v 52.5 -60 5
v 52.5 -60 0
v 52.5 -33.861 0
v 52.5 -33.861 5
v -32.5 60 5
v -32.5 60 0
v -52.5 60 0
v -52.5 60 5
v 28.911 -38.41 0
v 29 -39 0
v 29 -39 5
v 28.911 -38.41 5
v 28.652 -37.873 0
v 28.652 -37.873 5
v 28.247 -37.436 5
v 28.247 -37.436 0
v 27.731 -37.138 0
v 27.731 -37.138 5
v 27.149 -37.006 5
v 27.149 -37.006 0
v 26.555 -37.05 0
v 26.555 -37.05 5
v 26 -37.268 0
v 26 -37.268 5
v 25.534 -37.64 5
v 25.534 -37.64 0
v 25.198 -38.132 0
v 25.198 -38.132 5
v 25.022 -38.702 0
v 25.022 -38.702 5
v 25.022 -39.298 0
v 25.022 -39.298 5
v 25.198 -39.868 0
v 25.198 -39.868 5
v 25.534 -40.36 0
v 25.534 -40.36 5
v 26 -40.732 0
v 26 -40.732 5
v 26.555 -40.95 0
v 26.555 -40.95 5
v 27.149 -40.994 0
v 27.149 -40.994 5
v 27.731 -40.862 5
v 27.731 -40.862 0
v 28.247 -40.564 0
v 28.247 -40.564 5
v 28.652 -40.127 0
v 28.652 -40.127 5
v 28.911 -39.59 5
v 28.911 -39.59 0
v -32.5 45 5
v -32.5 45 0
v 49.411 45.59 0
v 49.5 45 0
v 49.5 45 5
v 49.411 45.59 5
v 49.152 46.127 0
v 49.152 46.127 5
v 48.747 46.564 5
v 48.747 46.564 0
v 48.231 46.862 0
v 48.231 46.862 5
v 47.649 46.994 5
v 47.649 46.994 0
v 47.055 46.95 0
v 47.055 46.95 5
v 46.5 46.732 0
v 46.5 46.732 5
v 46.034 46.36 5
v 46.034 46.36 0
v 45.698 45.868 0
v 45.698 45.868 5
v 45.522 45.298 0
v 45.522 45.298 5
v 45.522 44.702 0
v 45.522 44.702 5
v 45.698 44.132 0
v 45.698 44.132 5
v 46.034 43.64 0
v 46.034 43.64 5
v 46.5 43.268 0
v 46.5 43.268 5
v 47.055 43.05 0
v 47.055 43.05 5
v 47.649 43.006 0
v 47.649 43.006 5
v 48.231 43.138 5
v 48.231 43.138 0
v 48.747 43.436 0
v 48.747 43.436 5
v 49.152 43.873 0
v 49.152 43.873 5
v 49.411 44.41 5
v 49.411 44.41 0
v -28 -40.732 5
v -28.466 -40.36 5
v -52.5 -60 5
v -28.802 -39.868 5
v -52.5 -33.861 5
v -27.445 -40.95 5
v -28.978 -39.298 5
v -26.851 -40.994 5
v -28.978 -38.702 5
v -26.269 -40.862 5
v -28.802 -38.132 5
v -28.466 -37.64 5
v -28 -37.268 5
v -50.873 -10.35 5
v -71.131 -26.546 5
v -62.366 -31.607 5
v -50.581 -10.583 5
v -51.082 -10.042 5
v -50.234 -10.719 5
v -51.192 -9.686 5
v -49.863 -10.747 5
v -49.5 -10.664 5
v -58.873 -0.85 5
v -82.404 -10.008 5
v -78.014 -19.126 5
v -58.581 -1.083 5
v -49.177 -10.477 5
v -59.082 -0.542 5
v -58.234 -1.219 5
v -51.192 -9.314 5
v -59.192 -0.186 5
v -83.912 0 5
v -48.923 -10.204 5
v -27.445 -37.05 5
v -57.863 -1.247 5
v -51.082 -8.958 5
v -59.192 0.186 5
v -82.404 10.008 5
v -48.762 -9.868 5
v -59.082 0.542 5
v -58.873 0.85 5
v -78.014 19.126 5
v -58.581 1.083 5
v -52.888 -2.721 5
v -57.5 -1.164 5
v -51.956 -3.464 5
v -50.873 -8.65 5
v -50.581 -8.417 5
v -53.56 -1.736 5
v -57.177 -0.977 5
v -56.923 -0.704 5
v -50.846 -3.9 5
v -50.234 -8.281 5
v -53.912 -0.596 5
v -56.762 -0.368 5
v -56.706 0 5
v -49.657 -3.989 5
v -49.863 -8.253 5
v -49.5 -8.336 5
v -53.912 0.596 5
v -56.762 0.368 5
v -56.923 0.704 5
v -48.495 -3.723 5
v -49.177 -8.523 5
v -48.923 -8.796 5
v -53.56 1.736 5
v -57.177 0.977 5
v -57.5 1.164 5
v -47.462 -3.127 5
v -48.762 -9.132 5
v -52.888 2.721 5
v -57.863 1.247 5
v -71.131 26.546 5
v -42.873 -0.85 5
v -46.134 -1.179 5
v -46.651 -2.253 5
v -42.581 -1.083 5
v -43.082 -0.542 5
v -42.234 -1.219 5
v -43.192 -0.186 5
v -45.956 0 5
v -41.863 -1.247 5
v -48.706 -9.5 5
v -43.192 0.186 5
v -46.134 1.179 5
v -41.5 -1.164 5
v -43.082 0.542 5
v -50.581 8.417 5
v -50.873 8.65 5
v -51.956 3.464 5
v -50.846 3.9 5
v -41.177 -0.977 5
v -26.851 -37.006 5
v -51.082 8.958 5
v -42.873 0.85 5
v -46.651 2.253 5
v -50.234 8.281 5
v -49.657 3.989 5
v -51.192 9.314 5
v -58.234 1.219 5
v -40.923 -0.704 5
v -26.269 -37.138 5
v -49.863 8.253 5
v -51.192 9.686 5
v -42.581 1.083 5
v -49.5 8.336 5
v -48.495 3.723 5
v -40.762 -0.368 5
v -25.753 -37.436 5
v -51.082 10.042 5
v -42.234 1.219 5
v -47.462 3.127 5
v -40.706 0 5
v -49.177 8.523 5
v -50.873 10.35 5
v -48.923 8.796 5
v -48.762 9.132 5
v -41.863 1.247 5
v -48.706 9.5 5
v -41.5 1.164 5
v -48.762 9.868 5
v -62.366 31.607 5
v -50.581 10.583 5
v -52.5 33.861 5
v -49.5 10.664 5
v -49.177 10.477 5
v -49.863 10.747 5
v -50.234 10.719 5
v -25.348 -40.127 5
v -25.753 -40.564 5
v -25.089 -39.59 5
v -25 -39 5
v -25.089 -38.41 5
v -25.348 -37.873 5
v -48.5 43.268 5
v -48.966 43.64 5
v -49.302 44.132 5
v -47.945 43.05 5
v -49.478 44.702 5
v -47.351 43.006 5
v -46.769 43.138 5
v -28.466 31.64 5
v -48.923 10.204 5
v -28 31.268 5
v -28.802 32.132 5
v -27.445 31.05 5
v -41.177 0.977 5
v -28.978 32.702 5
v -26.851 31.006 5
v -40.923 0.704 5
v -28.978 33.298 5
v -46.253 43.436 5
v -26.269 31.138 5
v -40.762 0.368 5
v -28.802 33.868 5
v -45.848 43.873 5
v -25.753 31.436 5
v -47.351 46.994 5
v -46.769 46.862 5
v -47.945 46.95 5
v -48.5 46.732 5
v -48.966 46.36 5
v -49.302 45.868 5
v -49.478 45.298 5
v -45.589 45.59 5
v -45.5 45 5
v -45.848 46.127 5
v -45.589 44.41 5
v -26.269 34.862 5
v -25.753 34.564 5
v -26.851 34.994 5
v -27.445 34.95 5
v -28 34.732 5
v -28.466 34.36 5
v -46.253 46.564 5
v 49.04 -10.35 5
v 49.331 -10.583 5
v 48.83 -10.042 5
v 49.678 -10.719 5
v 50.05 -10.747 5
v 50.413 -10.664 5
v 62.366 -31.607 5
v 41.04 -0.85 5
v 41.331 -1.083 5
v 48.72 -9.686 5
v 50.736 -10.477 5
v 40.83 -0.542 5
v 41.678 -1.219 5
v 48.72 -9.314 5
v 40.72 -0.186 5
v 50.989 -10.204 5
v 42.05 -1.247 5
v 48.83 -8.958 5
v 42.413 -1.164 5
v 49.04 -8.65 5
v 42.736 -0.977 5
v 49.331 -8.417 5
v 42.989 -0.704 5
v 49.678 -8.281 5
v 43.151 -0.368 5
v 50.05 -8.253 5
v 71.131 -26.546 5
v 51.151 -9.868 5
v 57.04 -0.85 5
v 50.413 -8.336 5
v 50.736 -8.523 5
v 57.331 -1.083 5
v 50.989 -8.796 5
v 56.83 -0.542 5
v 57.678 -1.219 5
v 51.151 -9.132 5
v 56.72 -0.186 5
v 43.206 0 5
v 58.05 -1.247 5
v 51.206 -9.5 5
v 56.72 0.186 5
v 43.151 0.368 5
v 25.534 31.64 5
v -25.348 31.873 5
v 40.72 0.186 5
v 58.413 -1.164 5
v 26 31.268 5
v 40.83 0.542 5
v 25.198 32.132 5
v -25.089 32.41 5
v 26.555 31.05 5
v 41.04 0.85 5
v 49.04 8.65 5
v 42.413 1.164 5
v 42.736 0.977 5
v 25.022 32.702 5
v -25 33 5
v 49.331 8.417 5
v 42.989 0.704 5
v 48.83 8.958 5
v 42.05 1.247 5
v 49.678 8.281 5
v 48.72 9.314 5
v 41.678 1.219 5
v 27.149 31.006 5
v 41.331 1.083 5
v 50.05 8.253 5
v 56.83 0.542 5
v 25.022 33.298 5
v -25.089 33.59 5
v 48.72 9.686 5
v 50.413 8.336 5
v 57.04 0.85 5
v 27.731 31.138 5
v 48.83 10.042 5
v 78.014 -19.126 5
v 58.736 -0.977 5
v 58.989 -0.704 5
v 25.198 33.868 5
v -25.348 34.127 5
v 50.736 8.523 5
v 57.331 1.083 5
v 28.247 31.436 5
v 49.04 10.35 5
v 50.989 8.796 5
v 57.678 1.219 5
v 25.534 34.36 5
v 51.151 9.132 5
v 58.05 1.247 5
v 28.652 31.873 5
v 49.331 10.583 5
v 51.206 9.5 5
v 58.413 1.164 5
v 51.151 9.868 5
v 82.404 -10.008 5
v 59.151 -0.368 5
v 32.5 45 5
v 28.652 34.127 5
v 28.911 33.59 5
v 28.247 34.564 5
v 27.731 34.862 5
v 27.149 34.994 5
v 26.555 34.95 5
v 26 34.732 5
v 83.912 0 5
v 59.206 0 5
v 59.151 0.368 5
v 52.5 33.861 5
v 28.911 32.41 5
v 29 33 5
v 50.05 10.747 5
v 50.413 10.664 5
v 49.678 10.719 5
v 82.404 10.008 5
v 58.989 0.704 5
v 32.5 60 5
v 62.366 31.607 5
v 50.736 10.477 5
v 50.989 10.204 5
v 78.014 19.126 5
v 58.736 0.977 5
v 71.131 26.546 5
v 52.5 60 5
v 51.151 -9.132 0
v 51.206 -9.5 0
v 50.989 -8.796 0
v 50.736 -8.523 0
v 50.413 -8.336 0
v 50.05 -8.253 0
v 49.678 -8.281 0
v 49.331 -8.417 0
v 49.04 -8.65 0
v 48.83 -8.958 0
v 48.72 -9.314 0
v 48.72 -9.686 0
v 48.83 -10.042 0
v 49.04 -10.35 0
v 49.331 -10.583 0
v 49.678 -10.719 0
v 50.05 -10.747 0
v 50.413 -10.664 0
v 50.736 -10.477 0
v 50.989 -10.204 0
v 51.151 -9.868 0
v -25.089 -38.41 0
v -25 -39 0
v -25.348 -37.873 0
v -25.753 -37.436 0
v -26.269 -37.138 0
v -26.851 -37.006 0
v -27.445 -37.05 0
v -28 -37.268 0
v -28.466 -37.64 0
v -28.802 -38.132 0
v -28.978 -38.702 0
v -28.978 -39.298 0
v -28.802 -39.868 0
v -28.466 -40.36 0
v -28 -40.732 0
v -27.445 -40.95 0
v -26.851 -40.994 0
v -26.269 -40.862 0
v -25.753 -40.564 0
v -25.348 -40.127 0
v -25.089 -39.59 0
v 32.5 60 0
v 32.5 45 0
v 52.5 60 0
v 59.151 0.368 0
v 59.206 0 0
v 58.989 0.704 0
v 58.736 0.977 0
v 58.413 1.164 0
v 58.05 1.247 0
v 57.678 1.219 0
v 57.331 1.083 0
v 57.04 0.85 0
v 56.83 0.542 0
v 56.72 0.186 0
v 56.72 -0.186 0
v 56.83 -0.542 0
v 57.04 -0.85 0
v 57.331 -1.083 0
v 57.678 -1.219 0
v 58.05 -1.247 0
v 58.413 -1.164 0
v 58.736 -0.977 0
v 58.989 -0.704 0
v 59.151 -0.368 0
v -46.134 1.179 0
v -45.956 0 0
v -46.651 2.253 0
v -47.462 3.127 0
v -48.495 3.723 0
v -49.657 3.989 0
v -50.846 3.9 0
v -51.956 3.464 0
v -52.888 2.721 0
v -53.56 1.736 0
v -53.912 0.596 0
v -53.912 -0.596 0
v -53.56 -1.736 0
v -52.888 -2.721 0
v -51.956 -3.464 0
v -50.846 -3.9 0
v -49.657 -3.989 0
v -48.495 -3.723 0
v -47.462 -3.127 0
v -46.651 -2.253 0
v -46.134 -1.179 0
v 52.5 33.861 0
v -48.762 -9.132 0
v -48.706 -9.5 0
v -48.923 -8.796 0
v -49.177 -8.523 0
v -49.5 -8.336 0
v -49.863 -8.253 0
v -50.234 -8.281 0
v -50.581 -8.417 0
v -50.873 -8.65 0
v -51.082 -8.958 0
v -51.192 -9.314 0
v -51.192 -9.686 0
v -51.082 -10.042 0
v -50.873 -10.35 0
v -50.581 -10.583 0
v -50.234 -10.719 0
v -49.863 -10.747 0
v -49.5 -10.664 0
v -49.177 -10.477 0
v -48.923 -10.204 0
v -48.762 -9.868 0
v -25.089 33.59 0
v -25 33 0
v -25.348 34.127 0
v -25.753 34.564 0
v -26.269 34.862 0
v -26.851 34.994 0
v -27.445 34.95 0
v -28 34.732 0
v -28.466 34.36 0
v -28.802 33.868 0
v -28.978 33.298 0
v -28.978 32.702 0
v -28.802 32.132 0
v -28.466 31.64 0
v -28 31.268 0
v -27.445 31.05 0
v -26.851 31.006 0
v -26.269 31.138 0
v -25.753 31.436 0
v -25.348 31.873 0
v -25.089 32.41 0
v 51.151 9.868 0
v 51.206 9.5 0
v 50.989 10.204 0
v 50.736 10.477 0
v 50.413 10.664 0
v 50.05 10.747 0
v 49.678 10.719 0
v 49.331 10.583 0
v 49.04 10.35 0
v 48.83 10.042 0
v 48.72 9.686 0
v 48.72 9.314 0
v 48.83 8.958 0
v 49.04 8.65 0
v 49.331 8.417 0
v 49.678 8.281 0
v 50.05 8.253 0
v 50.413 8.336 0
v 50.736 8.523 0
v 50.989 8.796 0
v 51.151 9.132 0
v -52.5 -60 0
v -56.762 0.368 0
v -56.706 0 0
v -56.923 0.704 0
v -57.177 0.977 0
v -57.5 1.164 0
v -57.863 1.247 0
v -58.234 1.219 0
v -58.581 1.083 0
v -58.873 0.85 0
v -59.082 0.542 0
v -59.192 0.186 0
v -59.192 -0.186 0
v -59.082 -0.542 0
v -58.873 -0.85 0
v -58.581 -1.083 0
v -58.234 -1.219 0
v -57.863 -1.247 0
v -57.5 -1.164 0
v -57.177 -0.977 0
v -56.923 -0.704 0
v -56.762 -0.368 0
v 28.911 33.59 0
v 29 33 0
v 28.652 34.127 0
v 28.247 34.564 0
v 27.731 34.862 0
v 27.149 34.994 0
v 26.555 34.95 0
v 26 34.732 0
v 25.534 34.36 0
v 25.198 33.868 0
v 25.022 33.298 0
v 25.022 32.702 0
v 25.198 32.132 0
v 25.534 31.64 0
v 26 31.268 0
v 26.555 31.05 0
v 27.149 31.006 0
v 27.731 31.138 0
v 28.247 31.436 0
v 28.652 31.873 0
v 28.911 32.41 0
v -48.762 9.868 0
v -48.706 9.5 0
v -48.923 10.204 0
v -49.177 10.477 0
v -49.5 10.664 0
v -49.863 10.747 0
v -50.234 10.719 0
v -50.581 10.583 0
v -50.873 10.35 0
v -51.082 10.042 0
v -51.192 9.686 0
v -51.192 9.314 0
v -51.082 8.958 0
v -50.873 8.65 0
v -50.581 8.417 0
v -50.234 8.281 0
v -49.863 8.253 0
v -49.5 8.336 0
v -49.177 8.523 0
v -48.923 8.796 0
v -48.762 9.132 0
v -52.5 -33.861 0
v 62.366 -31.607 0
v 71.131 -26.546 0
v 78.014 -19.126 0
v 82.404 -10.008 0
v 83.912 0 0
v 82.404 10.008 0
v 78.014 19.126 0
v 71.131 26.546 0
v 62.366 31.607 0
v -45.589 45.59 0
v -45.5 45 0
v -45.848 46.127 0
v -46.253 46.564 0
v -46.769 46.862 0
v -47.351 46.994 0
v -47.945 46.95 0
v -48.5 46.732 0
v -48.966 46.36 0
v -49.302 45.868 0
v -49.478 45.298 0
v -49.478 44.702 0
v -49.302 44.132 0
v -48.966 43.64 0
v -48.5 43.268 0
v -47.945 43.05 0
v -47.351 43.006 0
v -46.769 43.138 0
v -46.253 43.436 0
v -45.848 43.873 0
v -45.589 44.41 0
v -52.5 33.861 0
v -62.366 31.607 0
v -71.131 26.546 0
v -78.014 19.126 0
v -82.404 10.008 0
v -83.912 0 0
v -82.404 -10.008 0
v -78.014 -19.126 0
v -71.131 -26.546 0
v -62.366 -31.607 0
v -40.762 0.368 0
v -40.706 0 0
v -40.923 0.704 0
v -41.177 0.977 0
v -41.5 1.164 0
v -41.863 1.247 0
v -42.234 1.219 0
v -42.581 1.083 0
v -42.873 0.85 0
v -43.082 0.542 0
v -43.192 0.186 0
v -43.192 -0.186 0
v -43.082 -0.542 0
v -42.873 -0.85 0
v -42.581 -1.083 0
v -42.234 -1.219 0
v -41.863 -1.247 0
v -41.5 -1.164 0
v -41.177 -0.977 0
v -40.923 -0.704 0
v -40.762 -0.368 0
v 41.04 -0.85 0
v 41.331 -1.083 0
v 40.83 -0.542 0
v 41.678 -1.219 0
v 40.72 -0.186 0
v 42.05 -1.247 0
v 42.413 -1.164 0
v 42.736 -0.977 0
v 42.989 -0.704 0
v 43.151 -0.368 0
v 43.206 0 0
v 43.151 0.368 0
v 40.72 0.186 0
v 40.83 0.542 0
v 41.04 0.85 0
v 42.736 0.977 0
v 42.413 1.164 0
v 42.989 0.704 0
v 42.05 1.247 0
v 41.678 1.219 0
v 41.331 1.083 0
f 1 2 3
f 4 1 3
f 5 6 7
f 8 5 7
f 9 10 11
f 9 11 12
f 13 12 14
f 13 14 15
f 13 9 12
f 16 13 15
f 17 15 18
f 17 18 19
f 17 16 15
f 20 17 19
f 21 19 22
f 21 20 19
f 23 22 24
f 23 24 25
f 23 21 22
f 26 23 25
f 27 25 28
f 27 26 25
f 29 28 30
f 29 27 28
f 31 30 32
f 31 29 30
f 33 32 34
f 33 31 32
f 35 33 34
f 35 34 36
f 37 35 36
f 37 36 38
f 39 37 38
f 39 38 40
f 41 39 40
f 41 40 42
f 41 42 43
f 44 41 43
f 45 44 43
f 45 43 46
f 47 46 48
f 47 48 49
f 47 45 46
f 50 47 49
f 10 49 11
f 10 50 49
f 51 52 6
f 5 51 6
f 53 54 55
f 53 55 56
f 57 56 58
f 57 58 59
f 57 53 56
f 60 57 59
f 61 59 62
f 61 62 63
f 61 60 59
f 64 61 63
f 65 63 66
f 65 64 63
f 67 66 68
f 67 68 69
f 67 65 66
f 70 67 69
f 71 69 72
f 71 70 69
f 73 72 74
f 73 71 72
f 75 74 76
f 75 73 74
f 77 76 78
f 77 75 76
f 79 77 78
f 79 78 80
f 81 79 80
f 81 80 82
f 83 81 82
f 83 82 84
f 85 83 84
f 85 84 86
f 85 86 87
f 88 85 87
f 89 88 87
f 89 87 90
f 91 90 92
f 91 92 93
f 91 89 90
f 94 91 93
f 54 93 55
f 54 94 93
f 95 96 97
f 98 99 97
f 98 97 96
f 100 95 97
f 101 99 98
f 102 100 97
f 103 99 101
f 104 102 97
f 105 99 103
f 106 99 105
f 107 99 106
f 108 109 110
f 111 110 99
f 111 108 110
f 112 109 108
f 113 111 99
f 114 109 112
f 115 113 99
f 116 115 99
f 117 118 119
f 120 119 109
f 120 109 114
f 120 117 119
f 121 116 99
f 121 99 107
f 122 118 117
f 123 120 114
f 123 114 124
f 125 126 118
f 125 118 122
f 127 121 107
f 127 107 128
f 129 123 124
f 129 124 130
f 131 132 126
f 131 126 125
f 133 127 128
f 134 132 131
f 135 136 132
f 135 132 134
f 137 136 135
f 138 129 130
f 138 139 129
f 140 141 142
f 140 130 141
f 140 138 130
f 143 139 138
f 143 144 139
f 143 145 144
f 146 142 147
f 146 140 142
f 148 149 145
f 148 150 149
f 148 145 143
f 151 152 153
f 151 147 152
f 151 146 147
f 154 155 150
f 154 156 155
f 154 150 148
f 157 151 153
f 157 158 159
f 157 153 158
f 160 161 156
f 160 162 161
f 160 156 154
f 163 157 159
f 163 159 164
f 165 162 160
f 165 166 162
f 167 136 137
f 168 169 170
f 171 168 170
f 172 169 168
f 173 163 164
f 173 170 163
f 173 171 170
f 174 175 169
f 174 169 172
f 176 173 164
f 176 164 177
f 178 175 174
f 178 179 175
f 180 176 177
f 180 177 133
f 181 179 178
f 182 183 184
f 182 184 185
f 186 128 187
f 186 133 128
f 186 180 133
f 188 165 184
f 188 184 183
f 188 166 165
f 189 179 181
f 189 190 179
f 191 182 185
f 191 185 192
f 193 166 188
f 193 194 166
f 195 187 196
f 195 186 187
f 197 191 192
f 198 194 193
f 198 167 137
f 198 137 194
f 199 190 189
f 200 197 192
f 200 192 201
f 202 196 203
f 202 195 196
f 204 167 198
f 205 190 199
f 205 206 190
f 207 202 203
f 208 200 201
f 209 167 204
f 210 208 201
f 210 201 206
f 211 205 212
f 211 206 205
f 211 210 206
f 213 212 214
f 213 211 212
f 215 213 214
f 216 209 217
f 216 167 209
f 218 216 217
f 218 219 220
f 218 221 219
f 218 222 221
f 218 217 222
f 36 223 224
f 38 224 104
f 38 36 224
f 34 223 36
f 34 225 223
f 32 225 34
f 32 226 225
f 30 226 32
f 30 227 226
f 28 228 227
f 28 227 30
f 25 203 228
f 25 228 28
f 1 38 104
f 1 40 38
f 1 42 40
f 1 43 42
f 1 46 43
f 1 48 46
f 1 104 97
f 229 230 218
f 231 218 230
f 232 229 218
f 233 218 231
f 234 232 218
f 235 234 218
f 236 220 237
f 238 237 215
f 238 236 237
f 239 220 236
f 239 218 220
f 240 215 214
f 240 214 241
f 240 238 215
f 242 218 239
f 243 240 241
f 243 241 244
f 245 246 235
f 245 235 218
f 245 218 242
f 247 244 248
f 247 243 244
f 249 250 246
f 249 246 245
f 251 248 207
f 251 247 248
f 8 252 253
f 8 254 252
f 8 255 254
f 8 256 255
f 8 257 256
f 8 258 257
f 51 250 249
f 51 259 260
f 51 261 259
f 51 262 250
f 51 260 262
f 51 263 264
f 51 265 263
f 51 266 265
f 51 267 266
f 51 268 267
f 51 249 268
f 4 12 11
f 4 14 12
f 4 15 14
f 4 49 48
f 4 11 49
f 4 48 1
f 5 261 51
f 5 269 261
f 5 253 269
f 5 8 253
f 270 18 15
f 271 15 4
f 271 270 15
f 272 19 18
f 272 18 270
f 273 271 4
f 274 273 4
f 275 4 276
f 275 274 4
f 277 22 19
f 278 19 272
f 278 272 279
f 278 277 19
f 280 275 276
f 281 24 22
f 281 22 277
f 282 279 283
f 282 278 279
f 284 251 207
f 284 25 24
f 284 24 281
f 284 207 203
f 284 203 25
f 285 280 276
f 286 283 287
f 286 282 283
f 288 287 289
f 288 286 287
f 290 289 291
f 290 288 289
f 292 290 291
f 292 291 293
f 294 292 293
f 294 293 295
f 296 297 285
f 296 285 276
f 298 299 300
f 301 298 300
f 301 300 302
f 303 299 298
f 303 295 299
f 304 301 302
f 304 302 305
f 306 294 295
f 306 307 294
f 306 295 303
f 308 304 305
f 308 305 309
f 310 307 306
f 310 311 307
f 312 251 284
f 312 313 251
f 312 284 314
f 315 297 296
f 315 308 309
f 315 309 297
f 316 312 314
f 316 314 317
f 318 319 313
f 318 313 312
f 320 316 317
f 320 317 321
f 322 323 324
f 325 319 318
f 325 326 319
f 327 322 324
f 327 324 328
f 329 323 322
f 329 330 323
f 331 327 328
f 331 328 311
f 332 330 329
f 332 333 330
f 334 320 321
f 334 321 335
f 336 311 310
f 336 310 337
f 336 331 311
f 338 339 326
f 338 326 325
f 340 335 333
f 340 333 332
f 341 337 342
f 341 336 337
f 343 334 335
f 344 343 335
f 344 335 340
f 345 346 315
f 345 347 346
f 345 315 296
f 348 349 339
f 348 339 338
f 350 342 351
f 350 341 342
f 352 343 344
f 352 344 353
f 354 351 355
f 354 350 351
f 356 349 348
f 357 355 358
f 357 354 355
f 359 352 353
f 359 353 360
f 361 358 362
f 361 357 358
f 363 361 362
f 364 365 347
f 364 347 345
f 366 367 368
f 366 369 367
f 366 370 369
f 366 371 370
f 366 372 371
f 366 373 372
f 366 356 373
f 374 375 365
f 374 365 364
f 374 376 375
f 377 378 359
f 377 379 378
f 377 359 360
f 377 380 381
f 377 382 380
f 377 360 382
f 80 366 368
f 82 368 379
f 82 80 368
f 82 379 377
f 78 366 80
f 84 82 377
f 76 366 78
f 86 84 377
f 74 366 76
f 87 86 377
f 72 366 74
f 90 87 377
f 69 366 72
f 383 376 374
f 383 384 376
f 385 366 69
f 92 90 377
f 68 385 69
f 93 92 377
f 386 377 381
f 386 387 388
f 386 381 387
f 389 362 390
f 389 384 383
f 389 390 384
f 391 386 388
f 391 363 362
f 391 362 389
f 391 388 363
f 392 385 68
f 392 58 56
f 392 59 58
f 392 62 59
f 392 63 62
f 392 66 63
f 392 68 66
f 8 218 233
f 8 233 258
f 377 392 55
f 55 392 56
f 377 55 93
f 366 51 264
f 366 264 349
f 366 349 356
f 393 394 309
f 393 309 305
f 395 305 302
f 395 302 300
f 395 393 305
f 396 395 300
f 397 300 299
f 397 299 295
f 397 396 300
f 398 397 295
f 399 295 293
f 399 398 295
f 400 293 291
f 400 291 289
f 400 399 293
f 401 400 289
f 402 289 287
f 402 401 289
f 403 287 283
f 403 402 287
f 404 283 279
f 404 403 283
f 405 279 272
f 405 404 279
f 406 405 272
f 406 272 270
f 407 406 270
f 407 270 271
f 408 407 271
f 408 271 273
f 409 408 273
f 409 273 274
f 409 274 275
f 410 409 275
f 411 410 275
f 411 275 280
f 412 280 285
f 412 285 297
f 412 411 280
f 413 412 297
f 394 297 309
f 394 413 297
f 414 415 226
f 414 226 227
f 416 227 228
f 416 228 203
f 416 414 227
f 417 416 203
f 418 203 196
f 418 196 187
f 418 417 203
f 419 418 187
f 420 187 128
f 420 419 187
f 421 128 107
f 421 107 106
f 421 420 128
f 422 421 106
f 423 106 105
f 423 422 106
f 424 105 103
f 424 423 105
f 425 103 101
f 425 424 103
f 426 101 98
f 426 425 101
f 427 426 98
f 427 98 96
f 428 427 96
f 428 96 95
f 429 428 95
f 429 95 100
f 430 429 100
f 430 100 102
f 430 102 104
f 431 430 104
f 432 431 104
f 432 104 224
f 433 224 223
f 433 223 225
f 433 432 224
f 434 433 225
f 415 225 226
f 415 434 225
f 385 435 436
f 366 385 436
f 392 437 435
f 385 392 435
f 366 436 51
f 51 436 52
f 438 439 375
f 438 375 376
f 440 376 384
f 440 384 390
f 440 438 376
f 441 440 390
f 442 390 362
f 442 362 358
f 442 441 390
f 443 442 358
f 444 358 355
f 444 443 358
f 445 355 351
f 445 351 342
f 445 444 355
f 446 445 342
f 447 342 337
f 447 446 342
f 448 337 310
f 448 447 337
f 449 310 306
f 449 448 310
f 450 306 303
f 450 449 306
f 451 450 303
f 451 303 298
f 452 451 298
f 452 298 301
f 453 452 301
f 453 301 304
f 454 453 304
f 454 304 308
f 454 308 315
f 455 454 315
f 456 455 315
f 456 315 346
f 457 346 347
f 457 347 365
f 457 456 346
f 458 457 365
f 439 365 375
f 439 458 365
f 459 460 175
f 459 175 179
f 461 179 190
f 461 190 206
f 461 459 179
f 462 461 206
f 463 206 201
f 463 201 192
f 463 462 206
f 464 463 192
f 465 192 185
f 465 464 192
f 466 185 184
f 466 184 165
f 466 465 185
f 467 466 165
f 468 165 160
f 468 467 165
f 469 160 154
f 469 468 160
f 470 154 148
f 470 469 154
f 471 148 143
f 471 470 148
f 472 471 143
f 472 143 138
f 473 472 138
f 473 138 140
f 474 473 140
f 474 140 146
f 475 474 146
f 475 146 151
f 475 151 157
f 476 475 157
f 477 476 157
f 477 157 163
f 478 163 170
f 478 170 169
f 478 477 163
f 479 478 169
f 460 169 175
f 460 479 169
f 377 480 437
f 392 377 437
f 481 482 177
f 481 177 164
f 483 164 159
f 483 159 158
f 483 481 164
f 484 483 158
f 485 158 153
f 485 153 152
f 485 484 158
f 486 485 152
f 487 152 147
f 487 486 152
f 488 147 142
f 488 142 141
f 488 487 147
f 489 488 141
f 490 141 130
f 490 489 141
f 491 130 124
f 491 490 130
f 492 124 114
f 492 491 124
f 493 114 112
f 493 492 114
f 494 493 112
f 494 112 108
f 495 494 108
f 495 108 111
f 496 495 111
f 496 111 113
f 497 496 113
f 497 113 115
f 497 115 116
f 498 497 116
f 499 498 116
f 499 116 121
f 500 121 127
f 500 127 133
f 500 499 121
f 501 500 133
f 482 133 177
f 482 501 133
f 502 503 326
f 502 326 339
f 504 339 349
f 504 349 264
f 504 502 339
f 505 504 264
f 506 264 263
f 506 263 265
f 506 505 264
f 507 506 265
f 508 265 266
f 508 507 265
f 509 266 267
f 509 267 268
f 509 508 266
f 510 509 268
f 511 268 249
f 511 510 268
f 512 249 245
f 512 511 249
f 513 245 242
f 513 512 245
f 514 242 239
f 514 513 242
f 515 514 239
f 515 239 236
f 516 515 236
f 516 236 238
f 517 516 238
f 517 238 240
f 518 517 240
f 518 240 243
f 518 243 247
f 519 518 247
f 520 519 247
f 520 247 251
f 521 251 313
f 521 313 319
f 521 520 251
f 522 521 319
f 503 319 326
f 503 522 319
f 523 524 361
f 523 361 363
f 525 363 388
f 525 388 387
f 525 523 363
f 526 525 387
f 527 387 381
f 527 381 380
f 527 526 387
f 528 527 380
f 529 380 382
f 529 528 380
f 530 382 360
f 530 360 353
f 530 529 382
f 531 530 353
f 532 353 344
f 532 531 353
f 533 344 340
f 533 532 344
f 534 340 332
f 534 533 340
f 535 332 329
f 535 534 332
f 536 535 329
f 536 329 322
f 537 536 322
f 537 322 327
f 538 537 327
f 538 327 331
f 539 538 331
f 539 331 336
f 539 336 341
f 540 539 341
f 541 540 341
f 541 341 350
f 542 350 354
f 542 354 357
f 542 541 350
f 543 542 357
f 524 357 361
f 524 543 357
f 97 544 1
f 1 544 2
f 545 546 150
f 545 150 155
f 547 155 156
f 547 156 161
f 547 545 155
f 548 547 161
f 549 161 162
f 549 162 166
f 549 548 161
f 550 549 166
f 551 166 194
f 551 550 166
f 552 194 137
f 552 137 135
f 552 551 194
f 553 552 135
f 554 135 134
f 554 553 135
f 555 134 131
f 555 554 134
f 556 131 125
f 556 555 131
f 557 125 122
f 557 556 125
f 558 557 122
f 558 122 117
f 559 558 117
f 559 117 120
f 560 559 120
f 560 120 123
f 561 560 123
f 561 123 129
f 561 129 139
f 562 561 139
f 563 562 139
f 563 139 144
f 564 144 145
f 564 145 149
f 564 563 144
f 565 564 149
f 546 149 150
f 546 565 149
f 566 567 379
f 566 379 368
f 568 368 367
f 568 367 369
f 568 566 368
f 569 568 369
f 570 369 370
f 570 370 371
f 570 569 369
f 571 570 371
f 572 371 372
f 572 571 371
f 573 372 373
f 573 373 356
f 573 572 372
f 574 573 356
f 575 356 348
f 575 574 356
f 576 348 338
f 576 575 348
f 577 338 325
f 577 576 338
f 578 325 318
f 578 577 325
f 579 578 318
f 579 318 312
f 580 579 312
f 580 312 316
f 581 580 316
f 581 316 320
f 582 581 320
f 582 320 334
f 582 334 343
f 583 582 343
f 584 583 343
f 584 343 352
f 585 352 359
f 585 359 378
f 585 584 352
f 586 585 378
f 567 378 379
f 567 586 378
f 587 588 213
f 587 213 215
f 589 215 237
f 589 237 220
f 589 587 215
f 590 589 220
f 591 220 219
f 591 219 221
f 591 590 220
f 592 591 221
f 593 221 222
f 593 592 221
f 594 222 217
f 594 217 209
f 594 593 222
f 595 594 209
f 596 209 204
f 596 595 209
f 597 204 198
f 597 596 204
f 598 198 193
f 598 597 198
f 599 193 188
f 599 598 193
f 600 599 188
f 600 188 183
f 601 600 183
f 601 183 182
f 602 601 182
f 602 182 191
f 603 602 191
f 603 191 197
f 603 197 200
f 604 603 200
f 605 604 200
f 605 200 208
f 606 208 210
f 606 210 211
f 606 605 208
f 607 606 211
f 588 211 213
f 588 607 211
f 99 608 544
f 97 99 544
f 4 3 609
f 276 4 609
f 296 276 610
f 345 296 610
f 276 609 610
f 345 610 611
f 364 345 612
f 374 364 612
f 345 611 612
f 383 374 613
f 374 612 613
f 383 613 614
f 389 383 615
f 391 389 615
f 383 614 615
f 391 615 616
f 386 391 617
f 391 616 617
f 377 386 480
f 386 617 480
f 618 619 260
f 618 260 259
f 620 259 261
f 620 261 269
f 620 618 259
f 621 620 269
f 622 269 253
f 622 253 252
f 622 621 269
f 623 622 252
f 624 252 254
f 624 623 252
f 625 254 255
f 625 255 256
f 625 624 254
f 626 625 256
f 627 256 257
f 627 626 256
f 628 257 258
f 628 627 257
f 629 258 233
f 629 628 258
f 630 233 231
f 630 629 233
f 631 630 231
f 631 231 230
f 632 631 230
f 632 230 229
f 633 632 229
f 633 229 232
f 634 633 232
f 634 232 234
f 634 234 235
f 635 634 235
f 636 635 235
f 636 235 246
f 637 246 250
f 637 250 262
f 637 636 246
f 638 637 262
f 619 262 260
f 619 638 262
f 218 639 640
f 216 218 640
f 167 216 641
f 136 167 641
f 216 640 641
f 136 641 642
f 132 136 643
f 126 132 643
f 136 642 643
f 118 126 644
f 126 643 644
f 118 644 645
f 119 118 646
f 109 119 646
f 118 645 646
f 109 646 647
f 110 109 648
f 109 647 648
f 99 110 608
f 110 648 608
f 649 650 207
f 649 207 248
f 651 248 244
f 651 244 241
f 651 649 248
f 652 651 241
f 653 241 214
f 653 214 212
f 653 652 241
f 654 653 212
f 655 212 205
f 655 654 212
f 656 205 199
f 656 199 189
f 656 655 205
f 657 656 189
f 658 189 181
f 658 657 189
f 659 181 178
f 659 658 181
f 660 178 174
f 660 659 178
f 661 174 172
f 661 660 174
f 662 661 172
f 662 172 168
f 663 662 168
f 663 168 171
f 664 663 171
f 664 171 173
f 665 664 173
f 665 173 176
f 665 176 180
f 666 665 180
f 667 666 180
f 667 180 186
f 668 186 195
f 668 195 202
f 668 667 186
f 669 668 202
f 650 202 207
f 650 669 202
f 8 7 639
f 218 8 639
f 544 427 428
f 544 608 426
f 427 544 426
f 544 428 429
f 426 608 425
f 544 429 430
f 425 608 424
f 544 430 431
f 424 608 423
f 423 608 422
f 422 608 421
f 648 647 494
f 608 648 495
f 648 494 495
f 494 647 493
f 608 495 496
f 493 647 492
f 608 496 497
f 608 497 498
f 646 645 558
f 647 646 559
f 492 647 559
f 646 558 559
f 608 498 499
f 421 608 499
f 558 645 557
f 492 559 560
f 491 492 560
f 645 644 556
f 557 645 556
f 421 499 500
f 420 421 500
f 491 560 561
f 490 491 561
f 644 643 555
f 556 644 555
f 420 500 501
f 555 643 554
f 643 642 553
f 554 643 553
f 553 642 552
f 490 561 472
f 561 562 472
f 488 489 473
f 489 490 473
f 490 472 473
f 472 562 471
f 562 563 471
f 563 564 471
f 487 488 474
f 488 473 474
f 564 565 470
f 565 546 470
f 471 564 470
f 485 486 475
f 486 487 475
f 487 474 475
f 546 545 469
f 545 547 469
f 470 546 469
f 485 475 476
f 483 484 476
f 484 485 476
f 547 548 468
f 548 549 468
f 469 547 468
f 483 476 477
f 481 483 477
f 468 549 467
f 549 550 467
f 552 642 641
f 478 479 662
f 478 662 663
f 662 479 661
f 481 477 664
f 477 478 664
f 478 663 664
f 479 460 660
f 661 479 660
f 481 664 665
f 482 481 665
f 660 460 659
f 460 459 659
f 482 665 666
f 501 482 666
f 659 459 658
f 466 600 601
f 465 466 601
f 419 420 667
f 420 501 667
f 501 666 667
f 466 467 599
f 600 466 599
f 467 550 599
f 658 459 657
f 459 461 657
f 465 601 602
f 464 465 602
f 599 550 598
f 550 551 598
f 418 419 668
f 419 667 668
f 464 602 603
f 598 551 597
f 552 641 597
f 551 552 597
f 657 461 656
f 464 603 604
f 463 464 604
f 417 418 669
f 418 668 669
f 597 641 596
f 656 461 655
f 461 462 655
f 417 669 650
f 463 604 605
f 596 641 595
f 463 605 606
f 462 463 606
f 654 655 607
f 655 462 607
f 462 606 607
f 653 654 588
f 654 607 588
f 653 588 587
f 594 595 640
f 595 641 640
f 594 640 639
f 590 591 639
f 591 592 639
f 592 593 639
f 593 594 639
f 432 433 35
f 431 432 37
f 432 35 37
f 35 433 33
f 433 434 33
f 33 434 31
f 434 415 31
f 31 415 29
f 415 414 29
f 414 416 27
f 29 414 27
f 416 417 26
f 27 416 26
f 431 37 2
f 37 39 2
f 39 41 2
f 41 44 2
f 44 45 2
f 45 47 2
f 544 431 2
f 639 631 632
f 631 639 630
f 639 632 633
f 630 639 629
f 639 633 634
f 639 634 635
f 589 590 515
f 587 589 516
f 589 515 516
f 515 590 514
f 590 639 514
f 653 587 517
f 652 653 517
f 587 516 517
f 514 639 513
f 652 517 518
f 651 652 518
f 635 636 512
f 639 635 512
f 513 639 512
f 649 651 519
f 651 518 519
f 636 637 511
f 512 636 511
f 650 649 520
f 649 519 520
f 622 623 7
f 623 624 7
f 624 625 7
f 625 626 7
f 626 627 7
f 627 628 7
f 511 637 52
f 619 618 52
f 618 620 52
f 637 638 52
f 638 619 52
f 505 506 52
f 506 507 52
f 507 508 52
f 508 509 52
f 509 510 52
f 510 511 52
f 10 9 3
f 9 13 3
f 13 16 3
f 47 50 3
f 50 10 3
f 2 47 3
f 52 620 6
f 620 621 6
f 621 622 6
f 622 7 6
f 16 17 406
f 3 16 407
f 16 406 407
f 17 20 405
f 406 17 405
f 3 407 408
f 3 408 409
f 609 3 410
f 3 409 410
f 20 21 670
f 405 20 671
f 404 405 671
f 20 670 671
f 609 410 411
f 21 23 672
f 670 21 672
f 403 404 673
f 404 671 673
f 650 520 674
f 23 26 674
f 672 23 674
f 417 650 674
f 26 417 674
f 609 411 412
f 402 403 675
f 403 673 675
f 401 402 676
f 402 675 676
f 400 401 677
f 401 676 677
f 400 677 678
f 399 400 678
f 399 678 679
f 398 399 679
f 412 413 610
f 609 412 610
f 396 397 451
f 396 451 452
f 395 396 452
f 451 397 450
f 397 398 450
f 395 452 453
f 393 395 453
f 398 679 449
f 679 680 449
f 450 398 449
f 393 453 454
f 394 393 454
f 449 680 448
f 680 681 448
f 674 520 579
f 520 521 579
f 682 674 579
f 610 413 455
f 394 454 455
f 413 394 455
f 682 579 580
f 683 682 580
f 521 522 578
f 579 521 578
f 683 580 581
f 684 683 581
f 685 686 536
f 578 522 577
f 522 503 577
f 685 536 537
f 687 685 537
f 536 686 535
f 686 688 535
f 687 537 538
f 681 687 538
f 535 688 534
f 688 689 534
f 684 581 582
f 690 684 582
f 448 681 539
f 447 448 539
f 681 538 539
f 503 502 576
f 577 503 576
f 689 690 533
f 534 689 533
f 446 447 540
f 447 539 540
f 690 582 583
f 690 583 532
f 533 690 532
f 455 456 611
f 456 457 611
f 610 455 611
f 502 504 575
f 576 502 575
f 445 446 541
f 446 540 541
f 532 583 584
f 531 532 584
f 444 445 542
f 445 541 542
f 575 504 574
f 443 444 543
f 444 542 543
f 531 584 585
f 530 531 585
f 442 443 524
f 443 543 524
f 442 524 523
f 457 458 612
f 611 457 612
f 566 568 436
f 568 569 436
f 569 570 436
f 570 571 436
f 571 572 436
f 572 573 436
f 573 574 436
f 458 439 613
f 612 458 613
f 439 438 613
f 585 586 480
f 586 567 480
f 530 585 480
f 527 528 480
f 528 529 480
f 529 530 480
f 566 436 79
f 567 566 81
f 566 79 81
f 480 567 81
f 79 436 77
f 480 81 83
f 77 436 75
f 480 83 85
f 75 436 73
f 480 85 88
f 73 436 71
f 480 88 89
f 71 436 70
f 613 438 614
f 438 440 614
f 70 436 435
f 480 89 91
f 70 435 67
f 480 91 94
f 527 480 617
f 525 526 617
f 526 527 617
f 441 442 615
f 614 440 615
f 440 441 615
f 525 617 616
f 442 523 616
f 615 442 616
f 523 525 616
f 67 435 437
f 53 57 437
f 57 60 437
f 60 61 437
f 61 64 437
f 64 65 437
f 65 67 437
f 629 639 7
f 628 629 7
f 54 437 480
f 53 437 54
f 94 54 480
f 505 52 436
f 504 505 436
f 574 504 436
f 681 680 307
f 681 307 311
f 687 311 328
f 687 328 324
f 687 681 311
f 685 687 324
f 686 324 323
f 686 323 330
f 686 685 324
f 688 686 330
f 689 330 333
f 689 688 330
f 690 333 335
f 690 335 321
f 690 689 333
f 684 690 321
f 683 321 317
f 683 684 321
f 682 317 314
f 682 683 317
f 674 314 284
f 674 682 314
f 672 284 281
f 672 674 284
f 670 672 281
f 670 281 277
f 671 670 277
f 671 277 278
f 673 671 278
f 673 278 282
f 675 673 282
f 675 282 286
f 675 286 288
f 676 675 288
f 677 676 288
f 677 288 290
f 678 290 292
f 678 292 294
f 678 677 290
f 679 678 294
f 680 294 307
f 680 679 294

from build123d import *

# Parameters (mm, degrees)
SKETCH1_R           = 4
SKETCH1_R_2         = 2
SKETCH1_R_3         = 1.25
BOSS_EXTRUDE1_DEPTH = 5


with BuildPart() as part:
    # Sketch1 → Boss-Extrude1 (new body)
    with BuildSketch(Plane.XY):
        with BuildLine():
            Line((-32.5, 60), (-52.5, 60))
            Line((-52.5, 60), (-52.5, 33.860836522))
            ThreePointArc((-52.5, 33.860836522), (-83.9125, 0), (-52.5, -33.860836522))
            Line((-52.5, -33.860836522), (-52.5, -60))
            Line((-52.5, -60), (52.5, -60))
            Line((52.5, -60), (52.5, -33.860836522))
            ThreePointArc((52.5, -33.860836522), (83.9125, 0), (52.5, 33.860836522))
            Line((52.5, 33.860836522), (52.5, 60))
            Line((52.5, 60), (32.5, 60))
            Line((32.5, 60), (32.5, 45))
            Line((32.5, 45), (-32.5, 45))
            Line((-32.5, 45), (-32.5, 60))
        make_face()
        with Locations((-49.95625, 0)):
            Circle(SKETCH1_R, mode=Mode.SUBTRACT)
        with Locations((-27, -39)):
            Circle(SKETCH1_R_2, mode=Mode.SUBTRACT)
        with Locations((27, -39)):
            Circle(SKETCH1_R_2, mode=Mode.SUBTRACT)
        with Locations((-27, 33)):
            Circle(SKETCH1_R_2, mode=Mode.SUBTRACT)
        with Locations((-47.5, 45)):
            Circle(SKETCH1_R_2, mode=Mode.SUBTRACT)
        with Locations((27, 33)):
            Circle(SKETCH1_R_2, mode=Mode.SUBTRACT)
        with Locations((47.5, 45)):
            Circle(SKETCH1_R_2, mode=Mode.SUBTRACT)
        with Locations((-41.95625, 0)):
            Circle(SKETCH1_R_3, mode=Mode.SUBTRACT)
        with Locations((-49.95625, 9.5)):
            Circle(SKETCH1_R_3, mode=Mode.SUBTRACT)
        with Locations((-49.95625, -9.5)):
            Circle(SKETCH1_R_3, mode=Mode.SUBTRACT)
        with Locations((-57.95625, 0)):
            Circle(SKETCH1_R_3, mode=Mode.SUBTRACT)
        with Locations((49.95625, 9.5)):
            Circle(SKETCH1_R_3, mode=Mode.SUBTRACT)
        with Locations((49.95625, -9.5)):
            Circle(SKETCH1_R_3, mode=Mode.SUBTRACT)
        with Locations((41.95625, 0)):
            Circle(SKETCH1_R_3, mode=Mode.SUBTRACT)
        with Locations((57.95625, 0)):
            Circle(SKETCH1_R_3, mode=Mode.SUBTRACT)
    extrude(amount=BOSS_EXTRUDE1_DEPTH)


solid = part.part
